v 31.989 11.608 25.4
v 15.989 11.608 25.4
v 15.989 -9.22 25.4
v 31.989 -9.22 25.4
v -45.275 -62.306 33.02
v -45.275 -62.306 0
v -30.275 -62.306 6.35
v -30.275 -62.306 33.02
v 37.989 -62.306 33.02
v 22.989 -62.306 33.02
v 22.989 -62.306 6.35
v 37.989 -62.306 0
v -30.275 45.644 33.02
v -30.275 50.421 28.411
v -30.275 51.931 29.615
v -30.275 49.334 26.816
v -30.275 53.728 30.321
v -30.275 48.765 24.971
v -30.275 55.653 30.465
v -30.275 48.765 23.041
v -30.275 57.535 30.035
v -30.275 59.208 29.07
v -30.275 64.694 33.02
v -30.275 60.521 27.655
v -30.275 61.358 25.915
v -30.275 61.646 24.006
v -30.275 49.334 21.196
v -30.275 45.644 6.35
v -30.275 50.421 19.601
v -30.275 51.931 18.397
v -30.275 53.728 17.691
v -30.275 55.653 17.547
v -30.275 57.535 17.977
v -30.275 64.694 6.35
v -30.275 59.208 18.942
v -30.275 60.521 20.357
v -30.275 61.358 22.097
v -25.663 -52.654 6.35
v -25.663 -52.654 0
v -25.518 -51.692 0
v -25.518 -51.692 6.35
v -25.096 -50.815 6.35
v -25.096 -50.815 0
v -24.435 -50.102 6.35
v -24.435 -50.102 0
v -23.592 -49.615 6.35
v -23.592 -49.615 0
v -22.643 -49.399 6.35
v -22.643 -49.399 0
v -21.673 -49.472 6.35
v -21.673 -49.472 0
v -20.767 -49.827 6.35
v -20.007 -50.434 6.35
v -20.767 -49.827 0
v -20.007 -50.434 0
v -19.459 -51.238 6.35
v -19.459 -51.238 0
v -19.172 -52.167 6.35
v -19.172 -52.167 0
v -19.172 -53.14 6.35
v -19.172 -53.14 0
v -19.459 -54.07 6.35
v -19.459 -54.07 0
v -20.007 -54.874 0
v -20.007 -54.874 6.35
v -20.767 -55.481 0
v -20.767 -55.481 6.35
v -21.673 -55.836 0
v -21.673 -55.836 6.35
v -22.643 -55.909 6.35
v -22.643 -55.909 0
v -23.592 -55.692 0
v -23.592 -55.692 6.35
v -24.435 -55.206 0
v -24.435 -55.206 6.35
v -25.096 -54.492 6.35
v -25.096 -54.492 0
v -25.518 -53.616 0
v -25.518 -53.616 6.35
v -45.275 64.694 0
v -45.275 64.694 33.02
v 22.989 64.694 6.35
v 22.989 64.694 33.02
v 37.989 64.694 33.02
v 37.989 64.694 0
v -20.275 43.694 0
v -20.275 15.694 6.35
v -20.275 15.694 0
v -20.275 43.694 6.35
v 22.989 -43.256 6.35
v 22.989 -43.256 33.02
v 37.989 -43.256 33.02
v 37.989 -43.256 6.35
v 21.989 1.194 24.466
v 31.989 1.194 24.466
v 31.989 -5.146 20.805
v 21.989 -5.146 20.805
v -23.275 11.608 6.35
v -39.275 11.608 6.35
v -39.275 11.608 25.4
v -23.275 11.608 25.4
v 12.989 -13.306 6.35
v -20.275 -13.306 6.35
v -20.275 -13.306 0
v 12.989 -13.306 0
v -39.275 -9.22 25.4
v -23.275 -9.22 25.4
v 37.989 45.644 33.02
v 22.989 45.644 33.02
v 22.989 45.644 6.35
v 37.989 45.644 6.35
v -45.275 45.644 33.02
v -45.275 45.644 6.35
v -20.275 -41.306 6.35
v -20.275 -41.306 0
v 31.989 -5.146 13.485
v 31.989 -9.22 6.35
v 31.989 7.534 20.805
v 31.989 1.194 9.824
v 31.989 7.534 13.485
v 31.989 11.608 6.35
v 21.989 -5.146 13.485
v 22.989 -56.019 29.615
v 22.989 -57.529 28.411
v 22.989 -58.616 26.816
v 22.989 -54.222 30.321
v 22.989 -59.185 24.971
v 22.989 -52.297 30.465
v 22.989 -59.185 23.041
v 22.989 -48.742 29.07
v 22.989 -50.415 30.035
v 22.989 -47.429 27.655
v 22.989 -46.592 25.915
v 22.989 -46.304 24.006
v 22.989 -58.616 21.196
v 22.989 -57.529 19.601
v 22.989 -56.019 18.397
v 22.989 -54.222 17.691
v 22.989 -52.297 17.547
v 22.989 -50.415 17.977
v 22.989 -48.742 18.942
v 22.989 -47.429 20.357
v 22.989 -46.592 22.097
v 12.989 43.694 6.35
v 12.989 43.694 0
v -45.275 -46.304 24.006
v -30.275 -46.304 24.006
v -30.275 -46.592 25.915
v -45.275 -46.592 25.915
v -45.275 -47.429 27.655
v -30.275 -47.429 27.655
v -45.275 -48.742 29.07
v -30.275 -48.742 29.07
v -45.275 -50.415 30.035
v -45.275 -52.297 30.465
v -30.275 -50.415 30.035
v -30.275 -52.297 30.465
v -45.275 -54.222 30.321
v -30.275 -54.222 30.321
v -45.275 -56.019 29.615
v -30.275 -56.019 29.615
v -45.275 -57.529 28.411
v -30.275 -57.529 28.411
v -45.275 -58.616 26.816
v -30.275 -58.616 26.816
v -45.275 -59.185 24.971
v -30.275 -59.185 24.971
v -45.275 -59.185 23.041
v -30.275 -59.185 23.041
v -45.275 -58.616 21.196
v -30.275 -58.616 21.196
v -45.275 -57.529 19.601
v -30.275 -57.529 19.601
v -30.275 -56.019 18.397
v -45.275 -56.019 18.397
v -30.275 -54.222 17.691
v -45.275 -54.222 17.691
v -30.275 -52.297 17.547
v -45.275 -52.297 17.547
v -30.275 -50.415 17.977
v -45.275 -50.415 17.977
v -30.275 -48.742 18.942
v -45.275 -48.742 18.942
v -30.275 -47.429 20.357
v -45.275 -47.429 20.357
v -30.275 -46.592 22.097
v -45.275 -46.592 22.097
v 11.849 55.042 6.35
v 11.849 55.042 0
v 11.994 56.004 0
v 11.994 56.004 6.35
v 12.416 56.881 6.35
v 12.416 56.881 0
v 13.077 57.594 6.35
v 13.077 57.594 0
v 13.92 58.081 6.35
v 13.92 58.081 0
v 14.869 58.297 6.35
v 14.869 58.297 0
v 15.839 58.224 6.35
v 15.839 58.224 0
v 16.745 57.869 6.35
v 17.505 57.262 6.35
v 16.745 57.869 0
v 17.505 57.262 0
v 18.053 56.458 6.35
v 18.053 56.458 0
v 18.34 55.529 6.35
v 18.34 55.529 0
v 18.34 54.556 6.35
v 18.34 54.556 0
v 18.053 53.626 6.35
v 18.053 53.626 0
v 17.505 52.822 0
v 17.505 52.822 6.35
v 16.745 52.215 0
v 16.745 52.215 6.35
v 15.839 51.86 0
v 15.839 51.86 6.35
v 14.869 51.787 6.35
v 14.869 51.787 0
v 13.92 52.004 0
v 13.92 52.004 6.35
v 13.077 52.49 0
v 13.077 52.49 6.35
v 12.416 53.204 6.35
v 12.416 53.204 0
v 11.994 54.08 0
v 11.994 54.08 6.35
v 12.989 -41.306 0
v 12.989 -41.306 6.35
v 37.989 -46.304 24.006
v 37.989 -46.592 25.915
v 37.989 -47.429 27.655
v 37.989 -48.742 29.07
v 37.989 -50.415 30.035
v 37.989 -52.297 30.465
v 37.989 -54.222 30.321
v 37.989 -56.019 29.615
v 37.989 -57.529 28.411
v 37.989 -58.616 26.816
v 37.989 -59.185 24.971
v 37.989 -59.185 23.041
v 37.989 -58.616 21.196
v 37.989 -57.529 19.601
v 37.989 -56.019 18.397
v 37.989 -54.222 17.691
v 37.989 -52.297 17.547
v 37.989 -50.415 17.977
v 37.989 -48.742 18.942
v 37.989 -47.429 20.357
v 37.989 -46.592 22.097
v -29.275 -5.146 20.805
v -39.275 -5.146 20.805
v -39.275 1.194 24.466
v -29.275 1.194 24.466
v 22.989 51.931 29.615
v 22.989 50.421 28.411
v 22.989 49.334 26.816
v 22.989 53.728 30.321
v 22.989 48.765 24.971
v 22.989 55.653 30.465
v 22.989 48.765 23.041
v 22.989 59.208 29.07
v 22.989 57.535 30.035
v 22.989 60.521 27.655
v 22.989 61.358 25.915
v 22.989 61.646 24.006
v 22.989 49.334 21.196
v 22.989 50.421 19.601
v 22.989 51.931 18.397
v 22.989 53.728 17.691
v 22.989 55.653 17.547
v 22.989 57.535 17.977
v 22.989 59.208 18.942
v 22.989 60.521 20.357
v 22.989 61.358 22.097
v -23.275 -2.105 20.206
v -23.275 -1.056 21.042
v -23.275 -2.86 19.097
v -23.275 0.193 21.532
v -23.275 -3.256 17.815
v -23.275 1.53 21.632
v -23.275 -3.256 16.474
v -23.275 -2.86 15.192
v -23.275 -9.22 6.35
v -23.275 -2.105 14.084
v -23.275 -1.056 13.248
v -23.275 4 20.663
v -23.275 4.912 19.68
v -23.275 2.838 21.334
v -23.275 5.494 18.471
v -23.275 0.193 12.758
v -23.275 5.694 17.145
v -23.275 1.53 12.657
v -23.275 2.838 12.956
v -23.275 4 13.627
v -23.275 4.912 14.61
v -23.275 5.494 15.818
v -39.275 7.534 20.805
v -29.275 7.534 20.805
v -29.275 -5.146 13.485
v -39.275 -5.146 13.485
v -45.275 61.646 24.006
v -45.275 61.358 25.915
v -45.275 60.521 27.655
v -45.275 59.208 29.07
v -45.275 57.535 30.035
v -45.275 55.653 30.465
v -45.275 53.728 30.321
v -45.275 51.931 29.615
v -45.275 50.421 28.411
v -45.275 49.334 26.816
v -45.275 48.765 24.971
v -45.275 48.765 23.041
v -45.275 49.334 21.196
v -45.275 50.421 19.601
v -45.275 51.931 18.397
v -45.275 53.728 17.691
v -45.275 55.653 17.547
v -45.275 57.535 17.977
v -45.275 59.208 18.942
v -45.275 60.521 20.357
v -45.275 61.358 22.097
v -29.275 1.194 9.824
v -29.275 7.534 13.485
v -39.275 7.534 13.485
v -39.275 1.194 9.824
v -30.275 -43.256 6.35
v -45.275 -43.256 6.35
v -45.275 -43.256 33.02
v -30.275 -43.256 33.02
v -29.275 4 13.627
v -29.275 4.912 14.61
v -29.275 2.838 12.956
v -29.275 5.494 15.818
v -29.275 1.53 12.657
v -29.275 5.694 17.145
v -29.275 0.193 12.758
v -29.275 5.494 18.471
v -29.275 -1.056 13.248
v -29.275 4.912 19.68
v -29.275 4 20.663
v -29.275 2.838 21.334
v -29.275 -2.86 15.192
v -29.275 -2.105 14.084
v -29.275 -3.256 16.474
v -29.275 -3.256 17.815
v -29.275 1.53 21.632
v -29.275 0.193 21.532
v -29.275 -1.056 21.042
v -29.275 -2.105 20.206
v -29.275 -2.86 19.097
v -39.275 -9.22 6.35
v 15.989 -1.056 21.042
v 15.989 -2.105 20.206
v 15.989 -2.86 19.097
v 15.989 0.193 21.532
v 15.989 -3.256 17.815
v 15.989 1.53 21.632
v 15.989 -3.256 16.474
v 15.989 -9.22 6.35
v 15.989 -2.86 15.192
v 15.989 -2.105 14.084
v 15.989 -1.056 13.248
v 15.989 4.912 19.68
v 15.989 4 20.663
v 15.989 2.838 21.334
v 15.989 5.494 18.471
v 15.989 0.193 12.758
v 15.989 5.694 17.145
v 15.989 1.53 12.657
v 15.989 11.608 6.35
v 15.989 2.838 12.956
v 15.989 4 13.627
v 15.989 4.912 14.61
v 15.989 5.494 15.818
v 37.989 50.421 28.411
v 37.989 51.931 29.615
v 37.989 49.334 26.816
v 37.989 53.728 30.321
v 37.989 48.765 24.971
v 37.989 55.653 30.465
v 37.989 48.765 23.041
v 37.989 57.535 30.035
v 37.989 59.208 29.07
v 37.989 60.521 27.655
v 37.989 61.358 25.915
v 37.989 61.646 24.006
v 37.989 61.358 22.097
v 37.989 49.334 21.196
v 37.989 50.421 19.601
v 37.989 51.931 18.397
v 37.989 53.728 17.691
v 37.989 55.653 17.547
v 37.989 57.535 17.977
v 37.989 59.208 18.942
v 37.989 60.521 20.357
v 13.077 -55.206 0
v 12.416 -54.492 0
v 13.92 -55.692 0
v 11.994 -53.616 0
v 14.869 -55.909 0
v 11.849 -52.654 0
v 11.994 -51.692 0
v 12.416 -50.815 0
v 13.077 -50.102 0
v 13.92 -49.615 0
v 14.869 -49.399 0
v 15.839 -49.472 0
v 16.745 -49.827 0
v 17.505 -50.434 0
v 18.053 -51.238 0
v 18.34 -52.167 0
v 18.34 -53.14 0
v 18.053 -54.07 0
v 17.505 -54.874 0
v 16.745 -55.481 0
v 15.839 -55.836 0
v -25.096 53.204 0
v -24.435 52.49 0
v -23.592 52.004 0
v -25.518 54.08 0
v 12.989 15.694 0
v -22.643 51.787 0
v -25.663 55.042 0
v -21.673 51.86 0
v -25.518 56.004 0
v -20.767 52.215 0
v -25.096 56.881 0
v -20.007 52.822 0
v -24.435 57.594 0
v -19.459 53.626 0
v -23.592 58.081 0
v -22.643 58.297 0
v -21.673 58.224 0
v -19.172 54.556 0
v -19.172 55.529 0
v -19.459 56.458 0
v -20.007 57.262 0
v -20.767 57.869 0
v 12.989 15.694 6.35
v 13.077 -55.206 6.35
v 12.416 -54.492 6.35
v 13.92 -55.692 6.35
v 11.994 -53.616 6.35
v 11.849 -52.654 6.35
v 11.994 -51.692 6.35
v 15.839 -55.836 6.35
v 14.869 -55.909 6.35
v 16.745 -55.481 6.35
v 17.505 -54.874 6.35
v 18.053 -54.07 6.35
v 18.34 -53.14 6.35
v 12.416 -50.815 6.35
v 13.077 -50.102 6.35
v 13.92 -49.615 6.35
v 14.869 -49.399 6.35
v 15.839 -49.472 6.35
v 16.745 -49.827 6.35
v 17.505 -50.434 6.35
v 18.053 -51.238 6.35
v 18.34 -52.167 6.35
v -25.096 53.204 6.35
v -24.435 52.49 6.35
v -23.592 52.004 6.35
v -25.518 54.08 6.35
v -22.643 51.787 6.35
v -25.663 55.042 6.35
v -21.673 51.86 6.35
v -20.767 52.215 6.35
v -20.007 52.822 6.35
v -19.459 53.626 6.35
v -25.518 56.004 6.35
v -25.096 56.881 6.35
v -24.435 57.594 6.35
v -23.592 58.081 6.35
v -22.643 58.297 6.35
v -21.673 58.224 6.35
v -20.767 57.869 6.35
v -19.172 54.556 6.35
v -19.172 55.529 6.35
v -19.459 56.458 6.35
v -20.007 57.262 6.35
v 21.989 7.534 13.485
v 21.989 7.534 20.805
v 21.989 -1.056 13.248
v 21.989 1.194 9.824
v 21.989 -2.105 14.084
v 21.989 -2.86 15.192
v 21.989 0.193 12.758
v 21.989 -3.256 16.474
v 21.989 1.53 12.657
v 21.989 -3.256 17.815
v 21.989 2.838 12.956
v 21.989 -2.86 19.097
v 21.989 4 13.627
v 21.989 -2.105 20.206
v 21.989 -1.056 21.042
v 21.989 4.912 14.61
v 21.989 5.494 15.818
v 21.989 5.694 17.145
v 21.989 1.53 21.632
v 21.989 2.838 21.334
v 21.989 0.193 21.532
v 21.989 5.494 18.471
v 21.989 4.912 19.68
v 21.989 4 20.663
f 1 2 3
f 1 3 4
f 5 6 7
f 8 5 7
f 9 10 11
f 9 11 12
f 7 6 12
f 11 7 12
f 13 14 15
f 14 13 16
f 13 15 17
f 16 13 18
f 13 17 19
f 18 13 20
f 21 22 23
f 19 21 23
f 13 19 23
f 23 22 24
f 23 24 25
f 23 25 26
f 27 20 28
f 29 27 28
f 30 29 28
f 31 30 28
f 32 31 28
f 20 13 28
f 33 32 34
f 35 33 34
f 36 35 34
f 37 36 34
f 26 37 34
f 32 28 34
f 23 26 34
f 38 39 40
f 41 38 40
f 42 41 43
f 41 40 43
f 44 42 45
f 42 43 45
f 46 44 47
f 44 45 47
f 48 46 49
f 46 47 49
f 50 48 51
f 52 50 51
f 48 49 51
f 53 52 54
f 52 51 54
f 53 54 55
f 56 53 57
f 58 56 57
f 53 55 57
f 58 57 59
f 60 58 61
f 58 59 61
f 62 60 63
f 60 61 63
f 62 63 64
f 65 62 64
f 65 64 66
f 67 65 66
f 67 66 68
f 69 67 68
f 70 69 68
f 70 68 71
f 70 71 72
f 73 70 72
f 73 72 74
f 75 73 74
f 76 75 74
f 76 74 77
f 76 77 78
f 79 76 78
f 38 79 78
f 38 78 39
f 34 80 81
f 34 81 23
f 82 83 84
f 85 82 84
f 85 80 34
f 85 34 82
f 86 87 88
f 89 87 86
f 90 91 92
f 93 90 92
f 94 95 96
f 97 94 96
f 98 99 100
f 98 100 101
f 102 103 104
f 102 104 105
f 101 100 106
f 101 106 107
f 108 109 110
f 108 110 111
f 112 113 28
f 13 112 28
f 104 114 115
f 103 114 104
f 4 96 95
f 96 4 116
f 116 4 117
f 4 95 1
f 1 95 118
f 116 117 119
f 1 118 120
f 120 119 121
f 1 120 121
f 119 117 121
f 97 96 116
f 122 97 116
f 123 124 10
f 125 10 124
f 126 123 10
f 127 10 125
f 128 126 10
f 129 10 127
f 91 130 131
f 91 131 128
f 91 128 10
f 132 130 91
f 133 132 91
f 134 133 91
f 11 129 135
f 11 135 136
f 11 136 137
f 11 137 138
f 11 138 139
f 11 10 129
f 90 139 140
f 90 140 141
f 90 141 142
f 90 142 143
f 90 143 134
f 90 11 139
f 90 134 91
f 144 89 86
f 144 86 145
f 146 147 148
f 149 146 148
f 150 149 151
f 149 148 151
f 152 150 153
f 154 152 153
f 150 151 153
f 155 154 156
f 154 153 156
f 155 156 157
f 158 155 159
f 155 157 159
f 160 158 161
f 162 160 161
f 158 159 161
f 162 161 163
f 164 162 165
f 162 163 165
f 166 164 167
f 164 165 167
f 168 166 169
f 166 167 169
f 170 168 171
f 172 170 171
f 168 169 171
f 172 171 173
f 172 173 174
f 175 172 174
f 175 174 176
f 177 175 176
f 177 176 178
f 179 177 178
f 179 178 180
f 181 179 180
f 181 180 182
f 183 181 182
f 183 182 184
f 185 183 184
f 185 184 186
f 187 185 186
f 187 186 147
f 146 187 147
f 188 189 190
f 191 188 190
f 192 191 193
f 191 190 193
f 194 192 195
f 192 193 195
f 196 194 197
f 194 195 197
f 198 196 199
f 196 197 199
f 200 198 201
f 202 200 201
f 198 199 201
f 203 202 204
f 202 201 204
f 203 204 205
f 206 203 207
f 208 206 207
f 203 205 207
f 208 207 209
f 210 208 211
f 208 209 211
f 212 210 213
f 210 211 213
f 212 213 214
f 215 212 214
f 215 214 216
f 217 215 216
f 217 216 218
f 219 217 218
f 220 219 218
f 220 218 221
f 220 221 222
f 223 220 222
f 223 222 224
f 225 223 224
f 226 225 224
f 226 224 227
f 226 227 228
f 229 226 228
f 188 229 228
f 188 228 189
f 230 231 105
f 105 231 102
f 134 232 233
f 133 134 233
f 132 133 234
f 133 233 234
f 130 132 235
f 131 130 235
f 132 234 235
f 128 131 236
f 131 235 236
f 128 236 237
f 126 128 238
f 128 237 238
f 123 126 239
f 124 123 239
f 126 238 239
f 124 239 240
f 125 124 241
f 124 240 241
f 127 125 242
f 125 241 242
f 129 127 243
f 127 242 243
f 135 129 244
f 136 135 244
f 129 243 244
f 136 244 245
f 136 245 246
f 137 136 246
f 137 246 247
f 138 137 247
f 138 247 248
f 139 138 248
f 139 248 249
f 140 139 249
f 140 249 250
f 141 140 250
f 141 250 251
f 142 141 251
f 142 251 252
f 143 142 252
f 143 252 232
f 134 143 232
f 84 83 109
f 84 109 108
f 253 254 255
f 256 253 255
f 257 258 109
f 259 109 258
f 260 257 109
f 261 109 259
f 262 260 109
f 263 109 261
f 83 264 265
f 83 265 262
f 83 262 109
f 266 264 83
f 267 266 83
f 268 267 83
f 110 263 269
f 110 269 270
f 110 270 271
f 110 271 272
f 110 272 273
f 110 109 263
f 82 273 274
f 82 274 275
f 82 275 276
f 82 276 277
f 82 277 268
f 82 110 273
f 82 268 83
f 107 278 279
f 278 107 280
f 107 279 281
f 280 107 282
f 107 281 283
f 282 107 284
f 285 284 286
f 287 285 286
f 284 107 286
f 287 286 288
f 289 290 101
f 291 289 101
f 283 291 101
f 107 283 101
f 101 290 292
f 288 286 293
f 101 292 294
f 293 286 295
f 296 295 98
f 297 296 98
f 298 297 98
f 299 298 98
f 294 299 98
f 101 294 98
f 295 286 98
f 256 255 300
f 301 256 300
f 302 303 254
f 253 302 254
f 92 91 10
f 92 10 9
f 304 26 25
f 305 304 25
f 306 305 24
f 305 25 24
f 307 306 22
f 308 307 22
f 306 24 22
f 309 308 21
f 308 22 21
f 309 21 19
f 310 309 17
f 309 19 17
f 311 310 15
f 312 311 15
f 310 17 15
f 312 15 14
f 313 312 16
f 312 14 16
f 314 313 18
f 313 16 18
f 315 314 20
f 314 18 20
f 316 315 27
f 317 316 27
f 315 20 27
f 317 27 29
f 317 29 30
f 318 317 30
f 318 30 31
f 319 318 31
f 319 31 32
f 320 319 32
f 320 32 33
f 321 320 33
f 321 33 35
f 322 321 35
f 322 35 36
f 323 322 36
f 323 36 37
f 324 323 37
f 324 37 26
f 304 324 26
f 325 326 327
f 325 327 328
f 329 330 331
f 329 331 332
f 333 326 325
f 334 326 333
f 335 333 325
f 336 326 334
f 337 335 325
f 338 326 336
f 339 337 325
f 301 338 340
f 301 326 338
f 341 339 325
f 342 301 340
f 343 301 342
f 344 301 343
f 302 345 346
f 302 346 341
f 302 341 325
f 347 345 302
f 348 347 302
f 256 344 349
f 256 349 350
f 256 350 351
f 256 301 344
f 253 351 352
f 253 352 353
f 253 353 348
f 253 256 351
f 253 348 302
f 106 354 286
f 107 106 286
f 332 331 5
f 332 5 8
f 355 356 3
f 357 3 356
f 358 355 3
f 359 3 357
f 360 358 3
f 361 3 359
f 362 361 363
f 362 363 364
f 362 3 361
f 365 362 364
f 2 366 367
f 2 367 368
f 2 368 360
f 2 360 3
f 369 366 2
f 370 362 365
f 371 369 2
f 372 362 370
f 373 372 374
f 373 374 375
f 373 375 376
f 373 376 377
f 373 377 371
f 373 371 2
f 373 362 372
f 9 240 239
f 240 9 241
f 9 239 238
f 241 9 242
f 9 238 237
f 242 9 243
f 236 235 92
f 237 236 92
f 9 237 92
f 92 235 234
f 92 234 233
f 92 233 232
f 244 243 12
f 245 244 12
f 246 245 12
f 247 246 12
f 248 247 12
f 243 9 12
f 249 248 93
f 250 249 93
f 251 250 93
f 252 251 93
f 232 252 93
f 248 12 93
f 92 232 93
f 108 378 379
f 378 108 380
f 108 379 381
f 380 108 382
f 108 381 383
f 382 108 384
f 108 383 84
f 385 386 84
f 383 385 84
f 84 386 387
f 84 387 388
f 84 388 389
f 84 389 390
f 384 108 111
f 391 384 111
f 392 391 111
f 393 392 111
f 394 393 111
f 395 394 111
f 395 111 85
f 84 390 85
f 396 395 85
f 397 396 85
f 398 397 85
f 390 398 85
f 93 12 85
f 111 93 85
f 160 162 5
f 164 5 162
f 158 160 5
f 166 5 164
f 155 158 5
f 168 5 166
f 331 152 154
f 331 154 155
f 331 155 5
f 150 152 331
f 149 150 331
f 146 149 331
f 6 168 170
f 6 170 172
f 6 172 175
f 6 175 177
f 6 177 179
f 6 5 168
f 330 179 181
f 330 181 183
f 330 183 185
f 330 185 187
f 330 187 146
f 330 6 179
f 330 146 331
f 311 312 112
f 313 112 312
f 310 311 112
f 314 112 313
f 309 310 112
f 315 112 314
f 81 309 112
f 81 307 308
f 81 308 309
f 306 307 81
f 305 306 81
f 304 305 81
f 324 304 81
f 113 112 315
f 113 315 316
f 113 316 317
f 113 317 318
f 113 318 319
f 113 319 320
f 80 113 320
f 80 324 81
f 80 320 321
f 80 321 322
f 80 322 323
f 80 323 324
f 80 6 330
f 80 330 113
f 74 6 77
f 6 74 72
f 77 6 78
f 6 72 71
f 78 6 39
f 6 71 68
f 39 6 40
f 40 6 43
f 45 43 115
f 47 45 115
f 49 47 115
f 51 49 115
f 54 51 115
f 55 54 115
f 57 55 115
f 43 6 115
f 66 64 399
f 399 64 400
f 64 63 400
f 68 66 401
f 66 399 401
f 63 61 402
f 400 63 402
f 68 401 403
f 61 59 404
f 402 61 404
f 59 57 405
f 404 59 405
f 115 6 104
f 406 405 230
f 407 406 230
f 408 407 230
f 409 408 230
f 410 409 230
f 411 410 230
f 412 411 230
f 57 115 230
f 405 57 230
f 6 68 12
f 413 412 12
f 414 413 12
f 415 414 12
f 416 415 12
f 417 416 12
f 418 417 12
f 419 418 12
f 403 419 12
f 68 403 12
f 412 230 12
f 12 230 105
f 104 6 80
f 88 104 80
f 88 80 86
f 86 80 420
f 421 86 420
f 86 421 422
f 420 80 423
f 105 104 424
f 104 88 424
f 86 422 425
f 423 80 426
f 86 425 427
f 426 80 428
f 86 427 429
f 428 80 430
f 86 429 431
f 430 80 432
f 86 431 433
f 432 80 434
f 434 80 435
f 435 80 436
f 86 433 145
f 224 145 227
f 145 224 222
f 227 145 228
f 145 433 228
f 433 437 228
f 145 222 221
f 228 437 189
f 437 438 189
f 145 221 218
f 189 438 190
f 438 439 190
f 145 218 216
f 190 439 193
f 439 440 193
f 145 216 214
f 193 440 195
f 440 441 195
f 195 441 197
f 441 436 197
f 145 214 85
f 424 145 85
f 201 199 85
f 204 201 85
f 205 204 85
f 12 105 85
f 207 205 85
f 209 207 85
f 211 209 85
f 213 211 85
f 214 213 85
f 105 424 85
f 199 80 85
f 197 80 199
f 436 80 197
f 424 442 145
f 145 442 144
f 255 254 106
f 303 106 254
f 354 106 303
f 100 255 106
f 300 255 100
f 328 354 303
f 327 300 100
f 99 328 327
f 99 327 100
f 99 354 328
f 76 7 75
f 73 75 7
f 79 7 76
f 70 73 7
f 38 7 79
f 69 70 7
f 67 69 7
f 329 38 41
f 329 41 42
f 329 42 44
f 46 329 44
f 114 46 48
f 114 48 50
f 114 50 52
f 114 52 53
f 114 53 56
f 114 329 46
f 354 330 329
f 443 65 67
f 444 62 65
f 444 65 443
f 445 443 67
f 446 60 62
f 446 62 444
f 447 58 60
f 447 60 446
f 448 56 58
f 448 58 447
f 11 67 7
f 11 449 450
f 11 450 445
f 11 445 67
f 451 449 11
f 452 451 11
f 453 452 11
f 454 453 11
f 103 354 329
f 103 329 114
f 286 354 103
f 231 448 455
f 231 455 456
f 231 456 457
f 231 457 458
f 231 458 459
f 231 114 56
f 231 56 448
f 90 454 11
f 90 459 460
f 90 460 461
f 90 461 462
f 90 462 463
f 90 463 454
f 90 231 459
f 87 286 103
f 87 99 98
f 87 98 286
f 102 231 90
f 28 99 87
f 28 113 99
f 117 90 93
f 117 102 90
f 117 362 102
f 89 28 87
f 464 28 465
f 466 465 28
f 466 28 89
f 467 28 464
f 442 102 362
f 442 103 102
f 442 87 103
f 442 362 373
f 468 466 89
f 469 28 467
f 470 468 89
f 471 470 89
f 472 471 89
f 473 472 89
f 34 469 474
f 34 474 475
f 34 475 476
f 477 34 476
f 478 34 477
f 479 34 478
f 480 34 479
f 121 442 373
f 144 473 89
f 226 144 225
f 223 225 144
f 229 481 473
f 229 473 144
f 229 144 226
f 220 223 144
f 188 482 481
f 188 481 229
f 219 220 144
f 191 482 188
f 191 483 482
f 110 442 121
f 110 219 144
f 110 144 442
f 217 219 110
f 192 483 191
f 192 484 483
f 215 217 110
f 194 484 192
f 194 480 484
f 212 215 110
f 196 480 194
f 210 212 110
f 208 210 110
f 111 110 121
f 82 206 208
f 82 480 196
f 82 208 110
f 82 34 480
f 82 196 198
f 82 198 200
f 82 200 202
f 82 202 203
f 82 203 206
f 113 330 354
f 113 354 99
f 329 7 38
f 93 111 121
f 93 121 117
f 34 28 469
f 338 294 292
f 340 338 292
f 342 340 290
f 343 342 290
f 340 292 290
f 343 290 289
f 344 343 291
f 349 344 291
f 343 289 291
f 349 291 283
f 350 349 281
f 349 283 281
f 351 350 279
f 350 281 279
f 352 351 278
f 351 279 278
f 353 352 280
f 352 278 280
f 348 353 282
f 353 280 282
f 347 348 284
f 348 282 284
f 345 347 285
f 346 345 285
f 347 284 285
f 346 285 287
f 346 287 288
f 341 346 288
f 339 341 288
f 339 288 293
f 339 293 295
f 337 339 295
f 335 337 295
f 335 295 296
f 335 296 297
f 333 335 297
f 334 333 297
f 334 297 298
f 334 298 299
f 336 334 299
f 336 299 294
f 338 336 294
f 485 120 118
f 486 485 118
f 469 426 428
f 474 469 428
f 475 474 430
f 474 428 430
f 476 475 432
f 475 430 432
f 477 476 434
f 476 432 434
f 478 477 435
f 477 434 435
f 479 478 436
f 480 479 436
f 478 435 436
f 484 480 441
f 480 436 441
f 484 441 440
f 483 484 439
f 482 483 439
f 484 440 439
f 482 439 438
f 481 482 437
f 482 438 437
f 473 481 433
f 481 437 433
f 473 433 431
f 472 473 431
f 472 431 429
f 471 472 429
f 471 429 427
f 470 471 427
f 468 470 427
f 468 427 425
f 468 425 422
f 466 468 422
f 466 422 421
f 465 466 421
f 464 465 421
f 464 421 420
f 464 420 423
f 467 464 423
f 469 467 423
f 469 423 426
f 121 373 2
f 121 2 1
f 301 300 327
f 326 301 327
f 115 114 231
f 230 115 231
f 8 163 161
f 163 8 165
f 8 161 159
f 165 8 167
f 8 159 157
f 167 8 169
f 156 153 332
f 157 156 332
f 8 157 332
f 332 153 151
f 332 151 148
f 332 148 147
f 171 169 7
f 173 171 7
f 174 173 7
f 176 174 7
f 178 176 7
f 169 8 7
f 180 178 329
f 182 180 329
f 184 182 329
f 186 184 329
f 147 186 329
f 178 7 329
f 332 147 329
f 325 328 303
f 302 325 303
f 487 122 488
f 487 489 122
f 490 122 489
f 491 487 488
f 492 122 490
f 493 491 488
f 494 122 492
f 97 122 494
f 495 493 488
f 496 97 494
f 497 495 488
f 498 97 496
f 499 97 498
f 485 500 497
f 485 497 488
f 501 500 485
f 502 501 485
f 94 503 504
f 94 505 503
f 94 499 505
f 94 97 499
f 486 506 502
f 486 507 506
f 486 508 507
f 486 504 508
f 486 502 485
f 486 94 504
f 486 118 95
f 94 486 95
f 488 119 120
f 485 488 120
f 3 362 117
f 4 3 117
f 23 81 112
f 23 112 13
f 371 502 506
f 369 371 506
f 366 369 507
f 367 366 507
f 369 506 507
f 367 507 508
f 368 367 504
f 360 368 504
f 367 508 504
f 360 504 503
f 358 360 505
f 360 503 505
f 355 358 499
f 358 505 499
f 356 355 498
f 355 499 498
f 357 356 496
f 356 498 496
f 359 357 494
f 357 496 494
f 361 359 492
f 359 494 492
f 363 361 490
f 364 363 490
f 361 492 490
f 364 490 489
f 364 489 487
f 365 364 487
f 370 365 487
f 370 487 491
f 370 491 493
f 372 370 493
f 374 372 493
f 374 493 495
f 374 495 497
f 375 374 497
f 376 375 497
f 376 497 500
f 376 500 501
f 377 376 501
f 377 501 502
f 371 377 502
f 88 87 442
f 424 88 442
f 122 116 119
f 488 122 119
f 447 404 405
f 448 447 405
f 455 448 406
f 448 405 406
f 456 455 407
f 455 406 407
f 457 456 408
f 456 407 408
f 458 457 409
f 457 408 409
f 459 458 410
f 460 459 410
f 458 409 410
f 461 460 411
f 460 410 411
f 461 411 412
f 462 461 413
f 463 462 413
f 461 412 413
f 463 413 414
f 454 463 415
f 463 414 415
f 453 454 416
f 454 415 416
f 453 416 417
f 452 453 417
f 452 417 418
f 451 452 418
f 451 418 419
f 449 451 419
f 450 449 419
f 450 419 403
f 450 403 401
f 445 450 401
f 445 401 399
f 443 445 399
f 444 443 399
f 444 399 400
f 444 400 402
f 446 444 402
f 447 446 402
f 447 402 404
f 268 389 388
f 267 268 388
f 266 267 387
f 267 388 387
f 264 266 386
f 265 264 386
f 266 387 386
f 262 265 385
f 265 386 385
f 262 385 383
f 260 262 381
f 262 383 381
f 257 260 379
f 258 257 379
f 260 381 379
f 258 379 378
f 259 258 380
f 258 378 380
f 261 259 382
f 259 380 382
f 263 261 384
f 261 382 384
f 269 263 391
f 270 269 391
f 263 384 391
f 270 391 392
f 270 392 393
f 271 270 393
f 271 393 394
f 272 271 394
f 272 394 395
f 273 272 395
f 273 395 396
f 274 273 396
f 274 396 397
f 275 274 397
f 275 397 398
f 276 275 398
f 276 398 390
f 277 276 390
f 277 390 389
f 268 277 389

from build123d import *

# Parameters (mm, degrees)
F0_W      = 83.264
F0_H      = 127
F1_DEPTH  = 6.35
F2_W      = 15
F2_H      = 19.05
F3_DEPTH  = 26.67
F5_D      = 12.954
F7_D      = 6.528
F8_W      = 16
F8_H      = 20.828
F9_DEPTH  = 19.05
F11_DEPTH = 10
F13_DEPTH = 10
F15_D     = 9
F16_W     = 33.264
F16_H     = 28
F17_DEPTH = 6.351


# Not quite as in the source:
# - a feature names something its author has since deleted; it is built from what else it names


with BuildPart() as f1:
    # F0 (on Top) → F1 (new body)
    with BuildSketch(Plane.XY):
        with Locations((-3.6434741511, 1.1941809207)):
            Rectangle(F0_W, F0_H)
    extrude(amount=F1_DEPTH)

    # F2 (on face) → F3 (join)
    with BuildSketch(Plane.XY.offset(6.35)):
        with Locations((-37.7754741511, 55.1691809207)):
            Rectangle(F2_W, F2_H)
        with Locations((30.4885258489, 55.1691809207)):
            Rectangle(F2_W, F2_H)
        with Locations((30.4885258489, -52.7808190793)):
            Rectangle(F2_W, F2_H)
        with Locations((-37.7754741511, -52.7808190793)):
            Rectangle(F2_W, F2_H)
    extrude(amount=F3_DEPTH)

    # F5 (through all)
    with Locations(Plane(origin=(-45.2754741511, 0, 0), x_dir=(0, -1, 0), z_dir=(-1, 0, 0))):
        with Locations((-55.1691809207, 24.006), (52.7808190793, 24.006)):
            Hole(F5_D / 2)

    # F7 (through all)
    with Locations(Plane.XY.offset(6.35)):
        with Locations((-22.3994741511, 55.0421809207), (15.1125258489, 55.0421809207), (-22.3994741511, -52.6538190793), (15.1125258489, -52.6538190793)):
            Hole(F7_D / 2)

    # F8 (on face) → F9 (join)
    with BuildSketch(Plane.XY.offset(6.35)):
        with Locations((-31.2754741511, 1.1941809207)):
            Rectangle(F8_W, F8_H)
        with Locations((23.9885258489, 1.1941809207)):
            Rectangle(F8_W, F8_H)
    extrude(amount=F9_DEPTH)

    # F10 (on face) → F11 (cut)
    with BuildSketch(Plane(origin=(-39.2754741511, 0, 0), x_dir=(0, -1, 0), z_dir=(-1, 0, 0))):
        Polygon((5.1458190793, 13.4845992933), (5.1458190793, 20.8054007067), (-1.1941809207, 24.4658014133), (-7.5341809207, 20.8054007067), (-7.5341809207, 13.4845992933), (-1.1941809207, 9.8241985867), align=None)
    extrude(amount=-F11_DEPTH, mode=Mode.SUBTRACT)

    # F12 (on face) → F13 (cut)
    with BuildSketch(Plane.YZ.offset(31.9885258489)):
        Polygon((7.5341809207, 13.4845992933), (7.5341809207, 20.8054007067), (1.1941809207, 24.4658014133), (-5.1458190793, 20.8054007067), (-5.1458190793, 13.4845992933), (1.1941809207, 9.8241985867), align=None)
    extrude(amount=-F13_DEPTH, mode=Mode.SUBTRACT)

    # F15 (through all)
    with Locations(Plane(origin=(-29.2754741511, 0, 0), x_dir=(0, -1, 0), z_dir=(-1, 0, 0))):
        with Locations((-1.1941809207, 17.1448014133)):
            Hole(F15_D / 2)

    # F16 (on face) → F17 (cut, through all)
    with BuildSketch(Plane.XY.offset(6.35)):
        with Locations((-3.6434741511, 29.6941809207)):
            Rectangle(F16_W, F16_H)
        with Locations((-3.6434741511, -27.3058190793)):
            Rectangle(F16_W, F16_H)
    extrude(amount=-F17_DEPTH, mode=Mode.SUBTRACT)


solid = f1.part
